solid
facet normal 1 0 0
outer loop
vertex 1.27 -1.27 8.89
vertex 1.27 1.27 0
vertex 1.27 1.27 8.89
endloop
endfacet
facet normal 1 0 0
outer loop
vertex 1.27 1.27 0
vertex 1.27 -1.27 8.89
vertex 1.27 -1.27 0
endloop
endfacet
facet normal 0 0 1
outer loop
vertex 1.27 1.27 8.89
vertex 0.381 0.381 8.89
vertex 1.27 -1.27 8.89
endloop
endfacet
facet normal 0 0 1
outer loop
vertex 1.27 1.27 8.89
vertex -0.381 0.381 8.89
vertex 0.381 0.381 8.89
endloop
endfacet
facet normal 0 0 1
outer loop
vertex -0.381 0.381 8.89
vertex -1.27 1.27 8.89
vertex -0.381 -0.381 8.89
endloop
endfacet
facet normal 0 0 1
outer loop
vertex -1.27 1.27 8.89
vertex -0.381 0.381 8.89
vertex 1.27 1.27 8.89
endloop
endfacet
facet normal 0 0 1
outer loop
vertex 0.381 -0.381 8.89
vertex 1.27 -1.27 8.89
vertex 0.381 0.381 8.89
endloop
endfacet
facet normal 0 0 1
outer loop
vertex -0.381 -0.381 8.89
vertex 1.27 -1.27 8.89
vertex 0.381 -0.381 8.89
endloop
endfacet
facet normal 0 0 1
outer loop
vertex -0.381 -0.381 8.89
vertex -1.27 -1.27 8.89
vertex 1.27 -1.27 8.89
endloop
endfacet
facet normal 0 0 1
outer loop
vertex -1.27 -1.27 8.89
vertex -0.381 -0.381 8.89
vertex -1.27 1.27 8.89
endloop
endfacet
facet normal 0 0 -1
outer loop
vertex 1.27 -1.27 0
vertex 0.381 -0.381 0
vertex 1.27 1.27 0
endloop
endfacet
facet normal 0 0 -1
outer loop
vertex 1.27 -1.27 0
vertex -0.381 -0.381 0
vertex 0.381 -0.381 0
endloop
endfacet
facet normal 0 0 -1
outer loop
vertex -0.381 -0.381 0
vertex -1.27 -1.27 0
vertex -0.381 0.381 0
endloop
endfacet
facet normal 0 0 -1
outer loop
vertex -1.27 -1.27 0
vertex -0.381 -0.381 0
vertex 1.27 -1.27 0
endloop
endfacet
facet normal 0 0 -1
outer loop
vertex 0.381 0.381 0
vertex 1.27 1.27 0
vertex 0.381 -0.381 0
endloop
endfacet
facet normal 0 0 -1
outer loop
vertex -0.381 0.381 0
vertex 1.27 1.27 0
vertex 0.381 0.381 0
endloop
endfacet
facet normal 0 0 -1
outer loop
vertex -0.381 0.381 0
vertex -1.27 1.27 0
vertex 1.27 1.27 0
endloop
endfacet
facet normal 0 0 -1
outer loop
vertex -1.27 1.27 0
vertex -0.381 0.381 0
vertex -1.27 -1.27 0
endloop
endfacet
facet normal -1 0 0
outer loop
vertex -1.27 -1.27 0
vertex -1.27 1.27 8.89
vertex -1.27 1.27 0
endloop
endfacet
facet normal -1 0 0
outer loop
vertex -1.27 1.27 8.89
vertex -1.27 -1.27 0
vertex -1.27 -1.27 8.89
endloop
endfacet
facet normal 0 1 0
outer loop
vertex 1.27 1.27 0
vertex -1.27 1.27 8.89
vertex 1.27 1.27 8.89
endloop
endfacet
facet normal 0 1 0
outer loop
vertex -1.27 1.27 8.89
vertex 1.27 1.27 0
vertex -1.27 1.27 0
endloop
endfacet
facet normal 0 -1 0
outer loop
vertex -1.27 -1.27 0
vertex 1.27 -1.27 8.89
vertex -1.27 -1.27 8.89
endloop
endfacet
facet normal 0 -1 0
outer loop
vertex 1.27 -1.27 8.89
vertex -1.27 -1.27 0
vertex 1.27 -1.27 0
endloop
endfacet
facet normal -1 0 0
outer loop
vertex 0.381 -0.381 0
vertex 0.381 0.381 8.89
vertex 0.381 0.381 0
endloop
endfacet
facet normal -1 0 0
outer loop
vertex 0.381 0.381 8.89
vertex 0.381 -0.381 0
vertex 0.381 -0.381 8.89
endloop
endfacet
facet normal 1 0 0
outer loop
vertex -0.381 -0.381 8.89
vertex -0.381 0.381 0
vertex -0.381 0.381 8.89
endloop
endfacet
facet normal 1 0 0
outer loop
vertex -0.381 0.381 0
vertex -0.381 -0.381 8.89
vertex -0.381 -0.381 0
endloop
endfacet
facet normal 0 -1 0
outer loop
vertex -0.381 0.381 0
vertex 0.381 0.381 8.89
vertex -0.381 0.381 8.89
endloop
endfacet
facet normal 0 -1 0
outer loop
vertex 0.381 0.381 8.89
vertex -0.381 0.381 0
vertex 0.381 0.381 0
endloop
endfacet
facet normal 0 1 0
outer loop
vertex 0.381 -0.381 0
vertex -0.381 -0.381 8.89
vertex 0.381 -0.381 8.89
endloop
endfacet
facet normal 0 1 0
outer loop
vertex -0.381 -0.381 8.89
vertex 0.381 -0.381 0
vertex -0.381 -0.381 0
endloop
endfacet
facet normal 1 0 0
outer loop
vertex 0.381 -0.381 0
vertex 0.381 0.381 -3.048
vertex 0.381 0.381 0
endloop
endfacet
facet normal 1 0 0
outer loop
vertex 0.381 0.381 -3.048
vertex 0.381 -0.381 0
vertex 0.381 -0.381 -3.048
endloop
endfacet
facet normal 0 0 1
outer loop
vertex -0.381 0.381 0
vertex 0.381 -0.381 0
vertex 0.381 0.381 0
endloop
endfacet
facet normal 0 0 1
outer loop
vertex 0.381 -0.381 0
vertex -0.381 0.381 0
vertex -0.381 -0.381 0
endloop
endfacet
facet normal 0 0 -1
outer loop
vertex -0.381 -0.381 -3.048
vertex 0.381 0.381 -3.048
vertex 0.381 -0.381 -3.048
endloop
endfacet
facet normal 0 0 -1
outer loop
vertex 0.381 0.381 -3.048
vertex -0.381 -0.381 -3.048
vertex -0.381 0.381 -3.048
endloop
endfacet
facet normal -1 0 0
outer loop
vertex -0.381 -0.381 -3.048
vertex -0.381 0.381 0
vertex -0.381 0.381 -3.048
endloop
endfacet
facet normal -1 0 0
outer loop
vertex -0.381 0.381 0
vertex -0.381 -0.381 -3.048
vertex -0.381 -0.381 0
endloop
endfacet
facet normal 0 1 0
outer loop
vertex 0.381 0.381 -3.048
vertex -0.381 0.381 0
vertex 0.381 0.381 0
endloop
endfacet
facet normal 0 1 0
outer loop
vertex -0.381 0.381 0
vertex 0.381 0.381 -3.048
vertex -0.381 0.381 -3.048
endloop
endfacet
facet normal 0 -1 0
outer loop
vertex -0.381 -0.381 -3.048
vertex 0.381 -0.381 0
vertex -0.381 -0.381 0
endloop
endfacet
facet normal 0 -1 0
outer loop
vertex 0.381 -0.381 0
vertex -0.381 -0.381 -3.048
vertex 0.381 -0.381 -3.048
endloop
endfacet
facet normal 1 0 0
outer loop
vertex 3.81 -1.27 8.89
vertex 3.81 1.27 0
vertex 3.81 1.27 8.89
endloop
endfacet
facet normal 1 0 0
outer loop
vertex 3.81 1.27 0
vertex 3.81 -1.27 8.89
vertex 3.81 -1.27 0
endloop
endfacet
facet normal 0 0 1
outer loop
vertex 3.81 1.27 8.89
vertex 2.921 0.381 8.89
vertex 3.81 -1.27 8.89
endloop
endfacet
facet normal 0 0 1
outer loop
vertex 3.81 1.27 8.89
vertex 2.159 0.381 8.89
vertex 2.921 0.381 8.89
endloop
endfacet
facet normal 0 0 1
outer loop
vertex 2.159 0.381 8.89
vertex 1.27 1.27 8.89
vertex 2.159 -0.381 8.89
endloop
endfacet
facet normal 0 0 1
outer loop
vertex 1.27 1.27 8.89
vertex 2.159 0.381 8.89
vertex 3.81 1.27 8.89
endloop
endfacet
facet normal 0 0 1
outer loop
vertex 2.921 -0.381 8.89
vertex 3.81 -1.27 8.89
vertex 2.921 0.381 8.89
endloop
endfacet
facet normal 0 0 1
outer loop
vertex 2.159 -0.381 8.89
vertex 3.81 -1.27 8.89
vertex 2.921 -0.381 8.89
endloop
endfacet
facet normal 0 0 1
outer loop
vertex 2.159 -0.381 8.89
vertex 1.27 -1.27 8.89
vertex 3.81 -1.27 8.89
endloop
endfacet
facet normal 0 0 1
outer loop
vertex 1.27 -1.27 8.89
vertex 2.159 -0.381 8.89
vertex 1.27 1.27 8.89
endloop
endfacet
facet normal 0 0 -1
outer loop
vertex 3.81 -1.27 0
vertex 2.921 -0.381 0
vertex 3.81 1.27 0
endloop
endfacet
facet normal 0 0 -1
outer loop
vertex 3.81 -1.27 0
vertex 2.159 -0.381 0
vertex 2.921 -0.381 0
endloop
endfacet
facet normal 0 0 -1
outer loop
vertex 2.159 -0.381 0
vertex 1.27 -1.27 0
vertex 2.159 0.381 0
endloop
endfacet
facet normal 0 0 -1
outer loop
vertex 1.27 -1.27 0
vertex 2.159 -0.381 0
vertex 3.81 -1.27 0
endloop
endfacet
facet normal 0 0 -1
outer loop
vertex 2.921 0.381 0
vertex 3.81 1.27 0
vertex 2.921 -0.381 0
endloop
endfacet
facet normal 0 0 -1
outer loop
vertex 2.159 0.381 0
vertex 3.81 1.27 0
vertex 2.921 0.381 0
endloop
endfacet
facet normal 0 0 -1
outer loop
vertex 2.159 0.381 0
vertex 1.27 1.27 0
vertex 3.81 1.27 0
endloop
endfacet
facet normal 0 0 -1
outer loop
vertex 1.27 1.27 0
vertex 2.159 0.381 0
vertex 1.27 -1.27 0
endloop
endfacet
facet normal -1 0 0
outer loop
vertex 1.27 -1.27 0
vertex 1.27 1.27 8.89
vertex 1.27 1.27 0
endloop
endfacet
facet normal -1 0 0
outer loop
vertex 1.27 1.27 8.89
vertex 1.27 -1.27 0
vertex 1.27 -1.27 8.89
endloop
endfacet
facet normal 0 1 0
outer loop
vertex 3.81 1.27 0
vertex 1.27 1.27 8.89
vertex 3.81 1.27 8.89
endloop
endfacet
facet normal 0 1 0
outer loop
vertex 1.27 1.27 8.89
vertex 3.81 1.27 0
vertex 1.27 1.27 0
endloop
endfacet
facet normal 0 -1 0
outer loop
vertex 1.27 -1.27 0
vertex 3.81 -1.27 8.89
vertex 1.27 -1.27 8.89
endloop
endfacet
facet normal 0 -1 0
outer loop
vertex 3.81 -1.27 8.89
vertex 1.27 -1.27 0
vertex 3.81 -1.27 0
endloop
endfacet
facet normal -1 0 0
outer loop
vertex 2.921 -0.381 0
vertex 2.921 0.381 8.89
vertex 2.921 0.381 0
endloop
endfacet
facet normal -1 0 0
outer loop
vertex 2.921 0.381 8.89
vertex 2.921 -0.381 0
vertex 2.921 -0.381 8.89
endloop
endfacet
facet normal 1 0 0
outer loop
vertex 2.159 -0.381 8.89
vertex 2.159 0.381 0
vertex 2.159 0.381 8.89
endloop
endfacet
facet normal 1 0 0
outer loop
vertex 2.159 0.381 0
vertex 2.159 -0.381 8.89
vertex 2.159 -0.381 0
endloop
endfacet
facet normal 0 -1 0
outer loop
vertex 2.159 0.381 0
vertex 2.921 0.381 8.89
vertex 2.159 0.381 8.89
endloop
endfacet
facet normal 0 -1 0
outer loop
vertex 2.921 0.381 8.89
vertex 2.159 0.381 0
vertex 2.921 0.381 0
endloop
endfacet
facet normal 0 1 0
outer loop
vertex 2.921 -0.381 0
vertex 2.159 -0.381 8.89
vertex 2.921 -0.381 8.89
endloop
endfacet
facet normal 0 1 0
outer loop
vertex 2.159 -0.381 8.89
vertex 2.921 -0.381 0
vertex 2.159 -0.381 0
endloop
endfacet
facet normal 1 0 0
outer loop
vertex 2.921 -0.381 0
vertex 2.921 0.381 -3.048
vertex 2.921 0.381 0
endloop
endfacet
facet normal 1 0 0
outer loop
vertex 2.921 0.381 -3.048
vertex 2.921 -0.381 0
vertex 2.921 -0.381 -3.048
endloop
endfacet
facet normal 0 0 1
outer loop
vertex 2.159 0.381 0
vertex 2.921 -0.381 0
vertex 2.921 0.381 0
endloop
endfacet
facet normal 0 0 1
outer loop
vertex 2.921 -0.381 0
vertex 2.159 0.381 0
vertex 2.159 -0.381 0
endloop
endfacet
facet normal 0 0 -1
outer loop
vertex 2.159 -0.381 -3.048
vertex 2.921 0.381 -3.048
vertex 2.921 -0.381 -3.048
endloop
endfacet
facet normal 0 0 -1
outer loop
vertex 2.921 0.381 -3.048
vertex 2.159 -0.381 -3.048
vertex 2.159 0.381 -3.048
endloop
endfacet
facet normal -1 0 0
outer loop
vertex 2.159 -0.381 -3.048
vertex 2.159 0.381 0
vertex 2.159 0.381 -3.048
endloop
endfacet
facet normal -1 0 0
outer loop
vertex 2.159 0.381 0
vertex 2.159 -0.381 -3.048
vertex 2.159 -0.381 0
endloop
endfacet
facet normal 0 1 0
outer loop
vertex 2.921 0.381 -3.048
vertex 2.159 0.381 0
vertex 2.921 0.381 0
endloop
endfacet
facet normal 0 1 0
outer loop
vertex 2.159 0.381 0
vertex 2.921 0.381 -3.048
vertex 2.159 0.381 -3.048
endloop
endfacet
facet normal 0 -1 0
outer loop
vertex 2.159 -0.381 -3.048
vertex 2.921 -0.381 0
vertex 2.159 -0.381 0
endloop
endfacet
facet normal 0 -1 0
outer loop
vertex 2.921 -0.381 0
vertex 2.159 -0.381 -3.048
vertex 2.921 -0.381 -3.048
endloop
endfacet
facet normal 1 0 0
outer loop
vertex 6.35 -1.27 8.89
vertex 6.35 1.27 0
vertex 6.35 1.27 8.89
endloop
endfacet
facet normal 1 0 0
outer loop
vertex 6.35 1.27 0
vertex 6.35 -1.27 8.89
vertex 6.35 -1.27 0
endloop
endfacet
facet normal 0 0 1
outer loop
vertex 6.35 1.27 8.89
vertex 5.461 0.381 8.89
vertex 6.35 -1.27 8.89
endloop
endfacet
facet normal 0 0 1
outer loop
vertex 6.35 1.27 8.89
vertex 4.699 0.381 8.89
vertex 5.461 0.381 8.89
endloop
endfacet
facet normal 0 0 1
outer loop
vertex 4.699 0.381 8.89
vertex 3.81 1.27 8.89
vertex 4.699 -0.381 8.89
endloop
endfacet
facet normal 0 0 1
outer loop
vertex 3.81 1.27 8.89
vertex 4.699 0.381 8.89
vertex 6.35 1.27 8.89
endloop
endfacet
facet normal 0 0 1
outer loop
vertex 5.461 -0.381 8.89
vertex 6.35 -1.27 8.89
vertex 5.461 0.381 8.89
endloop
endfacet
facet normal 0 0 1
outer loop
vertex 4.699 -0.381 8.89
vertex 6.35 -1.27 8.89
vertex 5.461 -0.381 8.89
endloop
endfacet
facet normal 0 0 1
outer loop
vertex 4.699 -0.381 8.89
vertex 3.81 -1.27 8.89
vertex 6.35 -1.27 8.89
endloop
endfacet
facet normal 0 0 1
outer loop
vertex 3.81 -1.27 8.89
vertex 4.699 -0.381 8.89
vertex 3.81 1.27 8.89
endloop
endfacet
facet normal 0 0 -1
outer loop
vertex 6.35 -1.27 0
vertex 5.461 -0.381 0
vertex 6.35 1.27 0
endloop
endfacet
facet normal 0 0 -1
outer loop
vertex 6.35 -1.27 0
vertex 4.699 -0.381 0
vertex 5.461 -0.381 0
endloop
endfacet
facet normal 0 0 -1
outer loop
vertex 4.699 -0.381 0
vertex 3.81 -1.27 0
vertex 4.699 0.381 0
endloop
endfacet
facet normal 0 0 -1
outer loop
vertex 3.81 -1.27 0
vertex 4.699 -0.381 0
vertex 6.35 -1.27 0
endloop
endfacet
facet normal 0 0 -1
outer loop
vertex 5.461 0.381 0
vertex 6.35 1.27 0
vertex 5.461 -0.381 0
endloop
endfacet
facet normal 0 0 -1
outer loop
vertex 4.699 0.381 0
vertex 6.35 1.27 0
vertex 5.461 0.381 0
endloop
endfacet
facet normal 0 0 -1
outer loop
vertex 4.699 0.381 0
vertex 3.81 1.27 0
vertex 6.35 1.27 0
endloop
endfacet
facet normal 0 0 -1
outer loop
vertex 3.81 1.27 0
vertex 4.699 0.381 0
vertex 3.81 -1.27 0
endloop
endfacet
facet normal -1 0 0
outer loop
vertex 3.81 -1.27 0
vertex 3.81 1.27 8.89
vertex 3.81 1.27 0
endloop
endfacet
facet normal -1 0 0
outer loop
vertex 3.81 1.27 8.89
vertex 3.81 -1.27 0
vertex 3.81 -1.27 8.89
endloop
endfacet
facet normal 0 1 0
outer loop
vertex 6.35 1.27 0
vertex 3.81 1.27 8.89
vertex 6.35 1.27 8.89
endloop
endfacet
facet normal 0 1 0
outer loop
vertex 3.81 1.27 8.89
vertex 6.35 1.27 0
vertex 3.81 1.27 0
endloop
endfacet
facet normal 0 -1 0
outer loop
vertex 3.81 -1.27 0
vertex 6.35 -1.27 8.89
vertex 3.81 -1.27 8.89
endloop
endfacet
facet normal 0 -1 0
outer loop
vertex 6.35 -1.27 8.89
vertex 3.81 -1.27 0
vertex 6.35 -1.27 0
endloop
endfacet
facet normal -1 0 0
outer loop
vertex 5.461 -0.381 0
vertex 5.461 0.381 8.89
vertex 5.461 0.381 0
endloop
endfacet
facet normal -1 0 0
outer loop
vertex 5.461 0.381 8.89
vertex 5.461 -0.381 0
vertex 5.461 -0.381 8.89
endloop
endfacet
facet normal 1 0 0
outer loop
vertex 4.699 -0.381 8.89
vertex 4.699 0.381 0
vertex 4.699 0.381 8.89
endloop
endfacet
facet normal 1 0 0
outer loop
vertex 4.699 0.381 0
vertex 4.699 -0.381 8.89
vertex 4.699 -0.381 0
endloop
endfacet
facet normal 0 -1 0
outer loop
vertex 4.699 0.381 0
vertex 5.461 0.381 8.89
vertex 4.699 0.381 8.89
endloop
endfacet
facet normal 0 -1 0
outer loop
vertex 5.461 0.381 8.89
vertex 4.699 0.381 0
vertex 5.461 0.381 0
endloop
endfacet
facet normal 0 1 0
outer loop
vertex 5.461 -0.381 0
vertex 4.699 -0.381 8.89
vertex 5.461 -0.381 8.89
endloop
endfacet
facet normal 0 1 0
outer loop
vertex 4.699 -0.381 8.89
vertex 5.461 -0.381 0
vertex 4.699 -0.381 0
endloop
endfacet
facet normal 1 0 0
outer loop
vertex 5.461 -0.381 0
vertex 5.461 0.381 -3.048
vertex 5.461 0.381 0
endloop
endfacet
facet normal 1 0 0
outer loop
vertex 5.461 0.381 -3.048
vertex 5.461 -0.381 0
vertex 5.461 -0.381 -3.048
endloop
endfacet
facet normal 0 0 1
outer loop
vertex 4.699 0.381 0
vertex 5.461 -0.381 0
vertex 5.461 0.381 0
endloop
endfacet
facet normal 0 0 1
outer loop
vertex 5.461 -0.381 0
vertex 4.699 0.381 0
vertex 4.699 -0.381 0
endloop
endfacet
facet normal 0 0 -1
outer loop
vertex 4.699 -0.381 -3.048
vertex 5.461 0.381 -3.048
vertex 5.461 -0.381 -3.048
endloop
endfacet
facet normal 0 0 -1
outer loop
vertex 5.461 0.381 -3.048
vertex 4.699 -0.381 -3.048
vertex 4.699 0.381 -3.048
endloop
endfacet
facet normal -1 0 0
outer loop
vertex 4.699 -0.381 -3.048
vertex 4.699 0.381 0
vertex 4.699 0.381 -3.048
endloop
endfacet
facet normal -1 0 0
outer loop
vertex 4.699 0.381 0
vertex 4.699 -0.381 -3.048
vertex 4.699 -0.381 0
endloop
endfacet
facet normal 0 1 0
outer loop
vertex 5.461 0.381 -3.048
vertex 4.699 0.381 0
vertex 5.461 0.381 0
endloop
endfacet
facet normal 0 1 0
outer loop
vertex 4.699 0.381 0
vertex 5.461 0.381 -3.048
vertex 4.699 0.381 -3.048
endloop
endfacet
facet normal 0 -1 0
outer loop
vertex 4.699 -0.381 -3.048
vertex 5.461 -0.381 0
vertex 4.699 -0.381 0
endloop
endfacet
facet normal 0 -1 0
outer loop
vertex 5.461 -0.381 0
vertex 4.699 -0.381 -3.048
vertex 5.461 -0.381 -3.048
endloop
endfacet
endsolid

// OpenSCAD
module pinF(n){
    millis= 0.0254;
    pin=    30*millis;
    pinH=   450*millis;
    space=  100*millis;
    cut=    10*millis;
    mXY=[   [0,0,0], 
            [0,1,0],
            [1,0,0],
            [1,1,0]]; //mirror XY
for (x=[0:1:n-1], y=[0:1:0]) translate([x*2.54,y*2.54,0]) {
    color("gold")
    translate ([-pin/2,-pin/2,-120*millis]) cube([pin,pin,120*millis]);    
    color("gray") 
    difference(){
        translate(-[space,space]/2) cube([space,space,pinH-space]);
//        for (i=mXY) mirror(i) translate([space,space]/2)cylinder(pinH,cut,cut,$fn=8);
        translate ([-pin/2,-pin/2,0]) cube([pin,pin,pinH]);    
    }
}
}
pinF(3);
